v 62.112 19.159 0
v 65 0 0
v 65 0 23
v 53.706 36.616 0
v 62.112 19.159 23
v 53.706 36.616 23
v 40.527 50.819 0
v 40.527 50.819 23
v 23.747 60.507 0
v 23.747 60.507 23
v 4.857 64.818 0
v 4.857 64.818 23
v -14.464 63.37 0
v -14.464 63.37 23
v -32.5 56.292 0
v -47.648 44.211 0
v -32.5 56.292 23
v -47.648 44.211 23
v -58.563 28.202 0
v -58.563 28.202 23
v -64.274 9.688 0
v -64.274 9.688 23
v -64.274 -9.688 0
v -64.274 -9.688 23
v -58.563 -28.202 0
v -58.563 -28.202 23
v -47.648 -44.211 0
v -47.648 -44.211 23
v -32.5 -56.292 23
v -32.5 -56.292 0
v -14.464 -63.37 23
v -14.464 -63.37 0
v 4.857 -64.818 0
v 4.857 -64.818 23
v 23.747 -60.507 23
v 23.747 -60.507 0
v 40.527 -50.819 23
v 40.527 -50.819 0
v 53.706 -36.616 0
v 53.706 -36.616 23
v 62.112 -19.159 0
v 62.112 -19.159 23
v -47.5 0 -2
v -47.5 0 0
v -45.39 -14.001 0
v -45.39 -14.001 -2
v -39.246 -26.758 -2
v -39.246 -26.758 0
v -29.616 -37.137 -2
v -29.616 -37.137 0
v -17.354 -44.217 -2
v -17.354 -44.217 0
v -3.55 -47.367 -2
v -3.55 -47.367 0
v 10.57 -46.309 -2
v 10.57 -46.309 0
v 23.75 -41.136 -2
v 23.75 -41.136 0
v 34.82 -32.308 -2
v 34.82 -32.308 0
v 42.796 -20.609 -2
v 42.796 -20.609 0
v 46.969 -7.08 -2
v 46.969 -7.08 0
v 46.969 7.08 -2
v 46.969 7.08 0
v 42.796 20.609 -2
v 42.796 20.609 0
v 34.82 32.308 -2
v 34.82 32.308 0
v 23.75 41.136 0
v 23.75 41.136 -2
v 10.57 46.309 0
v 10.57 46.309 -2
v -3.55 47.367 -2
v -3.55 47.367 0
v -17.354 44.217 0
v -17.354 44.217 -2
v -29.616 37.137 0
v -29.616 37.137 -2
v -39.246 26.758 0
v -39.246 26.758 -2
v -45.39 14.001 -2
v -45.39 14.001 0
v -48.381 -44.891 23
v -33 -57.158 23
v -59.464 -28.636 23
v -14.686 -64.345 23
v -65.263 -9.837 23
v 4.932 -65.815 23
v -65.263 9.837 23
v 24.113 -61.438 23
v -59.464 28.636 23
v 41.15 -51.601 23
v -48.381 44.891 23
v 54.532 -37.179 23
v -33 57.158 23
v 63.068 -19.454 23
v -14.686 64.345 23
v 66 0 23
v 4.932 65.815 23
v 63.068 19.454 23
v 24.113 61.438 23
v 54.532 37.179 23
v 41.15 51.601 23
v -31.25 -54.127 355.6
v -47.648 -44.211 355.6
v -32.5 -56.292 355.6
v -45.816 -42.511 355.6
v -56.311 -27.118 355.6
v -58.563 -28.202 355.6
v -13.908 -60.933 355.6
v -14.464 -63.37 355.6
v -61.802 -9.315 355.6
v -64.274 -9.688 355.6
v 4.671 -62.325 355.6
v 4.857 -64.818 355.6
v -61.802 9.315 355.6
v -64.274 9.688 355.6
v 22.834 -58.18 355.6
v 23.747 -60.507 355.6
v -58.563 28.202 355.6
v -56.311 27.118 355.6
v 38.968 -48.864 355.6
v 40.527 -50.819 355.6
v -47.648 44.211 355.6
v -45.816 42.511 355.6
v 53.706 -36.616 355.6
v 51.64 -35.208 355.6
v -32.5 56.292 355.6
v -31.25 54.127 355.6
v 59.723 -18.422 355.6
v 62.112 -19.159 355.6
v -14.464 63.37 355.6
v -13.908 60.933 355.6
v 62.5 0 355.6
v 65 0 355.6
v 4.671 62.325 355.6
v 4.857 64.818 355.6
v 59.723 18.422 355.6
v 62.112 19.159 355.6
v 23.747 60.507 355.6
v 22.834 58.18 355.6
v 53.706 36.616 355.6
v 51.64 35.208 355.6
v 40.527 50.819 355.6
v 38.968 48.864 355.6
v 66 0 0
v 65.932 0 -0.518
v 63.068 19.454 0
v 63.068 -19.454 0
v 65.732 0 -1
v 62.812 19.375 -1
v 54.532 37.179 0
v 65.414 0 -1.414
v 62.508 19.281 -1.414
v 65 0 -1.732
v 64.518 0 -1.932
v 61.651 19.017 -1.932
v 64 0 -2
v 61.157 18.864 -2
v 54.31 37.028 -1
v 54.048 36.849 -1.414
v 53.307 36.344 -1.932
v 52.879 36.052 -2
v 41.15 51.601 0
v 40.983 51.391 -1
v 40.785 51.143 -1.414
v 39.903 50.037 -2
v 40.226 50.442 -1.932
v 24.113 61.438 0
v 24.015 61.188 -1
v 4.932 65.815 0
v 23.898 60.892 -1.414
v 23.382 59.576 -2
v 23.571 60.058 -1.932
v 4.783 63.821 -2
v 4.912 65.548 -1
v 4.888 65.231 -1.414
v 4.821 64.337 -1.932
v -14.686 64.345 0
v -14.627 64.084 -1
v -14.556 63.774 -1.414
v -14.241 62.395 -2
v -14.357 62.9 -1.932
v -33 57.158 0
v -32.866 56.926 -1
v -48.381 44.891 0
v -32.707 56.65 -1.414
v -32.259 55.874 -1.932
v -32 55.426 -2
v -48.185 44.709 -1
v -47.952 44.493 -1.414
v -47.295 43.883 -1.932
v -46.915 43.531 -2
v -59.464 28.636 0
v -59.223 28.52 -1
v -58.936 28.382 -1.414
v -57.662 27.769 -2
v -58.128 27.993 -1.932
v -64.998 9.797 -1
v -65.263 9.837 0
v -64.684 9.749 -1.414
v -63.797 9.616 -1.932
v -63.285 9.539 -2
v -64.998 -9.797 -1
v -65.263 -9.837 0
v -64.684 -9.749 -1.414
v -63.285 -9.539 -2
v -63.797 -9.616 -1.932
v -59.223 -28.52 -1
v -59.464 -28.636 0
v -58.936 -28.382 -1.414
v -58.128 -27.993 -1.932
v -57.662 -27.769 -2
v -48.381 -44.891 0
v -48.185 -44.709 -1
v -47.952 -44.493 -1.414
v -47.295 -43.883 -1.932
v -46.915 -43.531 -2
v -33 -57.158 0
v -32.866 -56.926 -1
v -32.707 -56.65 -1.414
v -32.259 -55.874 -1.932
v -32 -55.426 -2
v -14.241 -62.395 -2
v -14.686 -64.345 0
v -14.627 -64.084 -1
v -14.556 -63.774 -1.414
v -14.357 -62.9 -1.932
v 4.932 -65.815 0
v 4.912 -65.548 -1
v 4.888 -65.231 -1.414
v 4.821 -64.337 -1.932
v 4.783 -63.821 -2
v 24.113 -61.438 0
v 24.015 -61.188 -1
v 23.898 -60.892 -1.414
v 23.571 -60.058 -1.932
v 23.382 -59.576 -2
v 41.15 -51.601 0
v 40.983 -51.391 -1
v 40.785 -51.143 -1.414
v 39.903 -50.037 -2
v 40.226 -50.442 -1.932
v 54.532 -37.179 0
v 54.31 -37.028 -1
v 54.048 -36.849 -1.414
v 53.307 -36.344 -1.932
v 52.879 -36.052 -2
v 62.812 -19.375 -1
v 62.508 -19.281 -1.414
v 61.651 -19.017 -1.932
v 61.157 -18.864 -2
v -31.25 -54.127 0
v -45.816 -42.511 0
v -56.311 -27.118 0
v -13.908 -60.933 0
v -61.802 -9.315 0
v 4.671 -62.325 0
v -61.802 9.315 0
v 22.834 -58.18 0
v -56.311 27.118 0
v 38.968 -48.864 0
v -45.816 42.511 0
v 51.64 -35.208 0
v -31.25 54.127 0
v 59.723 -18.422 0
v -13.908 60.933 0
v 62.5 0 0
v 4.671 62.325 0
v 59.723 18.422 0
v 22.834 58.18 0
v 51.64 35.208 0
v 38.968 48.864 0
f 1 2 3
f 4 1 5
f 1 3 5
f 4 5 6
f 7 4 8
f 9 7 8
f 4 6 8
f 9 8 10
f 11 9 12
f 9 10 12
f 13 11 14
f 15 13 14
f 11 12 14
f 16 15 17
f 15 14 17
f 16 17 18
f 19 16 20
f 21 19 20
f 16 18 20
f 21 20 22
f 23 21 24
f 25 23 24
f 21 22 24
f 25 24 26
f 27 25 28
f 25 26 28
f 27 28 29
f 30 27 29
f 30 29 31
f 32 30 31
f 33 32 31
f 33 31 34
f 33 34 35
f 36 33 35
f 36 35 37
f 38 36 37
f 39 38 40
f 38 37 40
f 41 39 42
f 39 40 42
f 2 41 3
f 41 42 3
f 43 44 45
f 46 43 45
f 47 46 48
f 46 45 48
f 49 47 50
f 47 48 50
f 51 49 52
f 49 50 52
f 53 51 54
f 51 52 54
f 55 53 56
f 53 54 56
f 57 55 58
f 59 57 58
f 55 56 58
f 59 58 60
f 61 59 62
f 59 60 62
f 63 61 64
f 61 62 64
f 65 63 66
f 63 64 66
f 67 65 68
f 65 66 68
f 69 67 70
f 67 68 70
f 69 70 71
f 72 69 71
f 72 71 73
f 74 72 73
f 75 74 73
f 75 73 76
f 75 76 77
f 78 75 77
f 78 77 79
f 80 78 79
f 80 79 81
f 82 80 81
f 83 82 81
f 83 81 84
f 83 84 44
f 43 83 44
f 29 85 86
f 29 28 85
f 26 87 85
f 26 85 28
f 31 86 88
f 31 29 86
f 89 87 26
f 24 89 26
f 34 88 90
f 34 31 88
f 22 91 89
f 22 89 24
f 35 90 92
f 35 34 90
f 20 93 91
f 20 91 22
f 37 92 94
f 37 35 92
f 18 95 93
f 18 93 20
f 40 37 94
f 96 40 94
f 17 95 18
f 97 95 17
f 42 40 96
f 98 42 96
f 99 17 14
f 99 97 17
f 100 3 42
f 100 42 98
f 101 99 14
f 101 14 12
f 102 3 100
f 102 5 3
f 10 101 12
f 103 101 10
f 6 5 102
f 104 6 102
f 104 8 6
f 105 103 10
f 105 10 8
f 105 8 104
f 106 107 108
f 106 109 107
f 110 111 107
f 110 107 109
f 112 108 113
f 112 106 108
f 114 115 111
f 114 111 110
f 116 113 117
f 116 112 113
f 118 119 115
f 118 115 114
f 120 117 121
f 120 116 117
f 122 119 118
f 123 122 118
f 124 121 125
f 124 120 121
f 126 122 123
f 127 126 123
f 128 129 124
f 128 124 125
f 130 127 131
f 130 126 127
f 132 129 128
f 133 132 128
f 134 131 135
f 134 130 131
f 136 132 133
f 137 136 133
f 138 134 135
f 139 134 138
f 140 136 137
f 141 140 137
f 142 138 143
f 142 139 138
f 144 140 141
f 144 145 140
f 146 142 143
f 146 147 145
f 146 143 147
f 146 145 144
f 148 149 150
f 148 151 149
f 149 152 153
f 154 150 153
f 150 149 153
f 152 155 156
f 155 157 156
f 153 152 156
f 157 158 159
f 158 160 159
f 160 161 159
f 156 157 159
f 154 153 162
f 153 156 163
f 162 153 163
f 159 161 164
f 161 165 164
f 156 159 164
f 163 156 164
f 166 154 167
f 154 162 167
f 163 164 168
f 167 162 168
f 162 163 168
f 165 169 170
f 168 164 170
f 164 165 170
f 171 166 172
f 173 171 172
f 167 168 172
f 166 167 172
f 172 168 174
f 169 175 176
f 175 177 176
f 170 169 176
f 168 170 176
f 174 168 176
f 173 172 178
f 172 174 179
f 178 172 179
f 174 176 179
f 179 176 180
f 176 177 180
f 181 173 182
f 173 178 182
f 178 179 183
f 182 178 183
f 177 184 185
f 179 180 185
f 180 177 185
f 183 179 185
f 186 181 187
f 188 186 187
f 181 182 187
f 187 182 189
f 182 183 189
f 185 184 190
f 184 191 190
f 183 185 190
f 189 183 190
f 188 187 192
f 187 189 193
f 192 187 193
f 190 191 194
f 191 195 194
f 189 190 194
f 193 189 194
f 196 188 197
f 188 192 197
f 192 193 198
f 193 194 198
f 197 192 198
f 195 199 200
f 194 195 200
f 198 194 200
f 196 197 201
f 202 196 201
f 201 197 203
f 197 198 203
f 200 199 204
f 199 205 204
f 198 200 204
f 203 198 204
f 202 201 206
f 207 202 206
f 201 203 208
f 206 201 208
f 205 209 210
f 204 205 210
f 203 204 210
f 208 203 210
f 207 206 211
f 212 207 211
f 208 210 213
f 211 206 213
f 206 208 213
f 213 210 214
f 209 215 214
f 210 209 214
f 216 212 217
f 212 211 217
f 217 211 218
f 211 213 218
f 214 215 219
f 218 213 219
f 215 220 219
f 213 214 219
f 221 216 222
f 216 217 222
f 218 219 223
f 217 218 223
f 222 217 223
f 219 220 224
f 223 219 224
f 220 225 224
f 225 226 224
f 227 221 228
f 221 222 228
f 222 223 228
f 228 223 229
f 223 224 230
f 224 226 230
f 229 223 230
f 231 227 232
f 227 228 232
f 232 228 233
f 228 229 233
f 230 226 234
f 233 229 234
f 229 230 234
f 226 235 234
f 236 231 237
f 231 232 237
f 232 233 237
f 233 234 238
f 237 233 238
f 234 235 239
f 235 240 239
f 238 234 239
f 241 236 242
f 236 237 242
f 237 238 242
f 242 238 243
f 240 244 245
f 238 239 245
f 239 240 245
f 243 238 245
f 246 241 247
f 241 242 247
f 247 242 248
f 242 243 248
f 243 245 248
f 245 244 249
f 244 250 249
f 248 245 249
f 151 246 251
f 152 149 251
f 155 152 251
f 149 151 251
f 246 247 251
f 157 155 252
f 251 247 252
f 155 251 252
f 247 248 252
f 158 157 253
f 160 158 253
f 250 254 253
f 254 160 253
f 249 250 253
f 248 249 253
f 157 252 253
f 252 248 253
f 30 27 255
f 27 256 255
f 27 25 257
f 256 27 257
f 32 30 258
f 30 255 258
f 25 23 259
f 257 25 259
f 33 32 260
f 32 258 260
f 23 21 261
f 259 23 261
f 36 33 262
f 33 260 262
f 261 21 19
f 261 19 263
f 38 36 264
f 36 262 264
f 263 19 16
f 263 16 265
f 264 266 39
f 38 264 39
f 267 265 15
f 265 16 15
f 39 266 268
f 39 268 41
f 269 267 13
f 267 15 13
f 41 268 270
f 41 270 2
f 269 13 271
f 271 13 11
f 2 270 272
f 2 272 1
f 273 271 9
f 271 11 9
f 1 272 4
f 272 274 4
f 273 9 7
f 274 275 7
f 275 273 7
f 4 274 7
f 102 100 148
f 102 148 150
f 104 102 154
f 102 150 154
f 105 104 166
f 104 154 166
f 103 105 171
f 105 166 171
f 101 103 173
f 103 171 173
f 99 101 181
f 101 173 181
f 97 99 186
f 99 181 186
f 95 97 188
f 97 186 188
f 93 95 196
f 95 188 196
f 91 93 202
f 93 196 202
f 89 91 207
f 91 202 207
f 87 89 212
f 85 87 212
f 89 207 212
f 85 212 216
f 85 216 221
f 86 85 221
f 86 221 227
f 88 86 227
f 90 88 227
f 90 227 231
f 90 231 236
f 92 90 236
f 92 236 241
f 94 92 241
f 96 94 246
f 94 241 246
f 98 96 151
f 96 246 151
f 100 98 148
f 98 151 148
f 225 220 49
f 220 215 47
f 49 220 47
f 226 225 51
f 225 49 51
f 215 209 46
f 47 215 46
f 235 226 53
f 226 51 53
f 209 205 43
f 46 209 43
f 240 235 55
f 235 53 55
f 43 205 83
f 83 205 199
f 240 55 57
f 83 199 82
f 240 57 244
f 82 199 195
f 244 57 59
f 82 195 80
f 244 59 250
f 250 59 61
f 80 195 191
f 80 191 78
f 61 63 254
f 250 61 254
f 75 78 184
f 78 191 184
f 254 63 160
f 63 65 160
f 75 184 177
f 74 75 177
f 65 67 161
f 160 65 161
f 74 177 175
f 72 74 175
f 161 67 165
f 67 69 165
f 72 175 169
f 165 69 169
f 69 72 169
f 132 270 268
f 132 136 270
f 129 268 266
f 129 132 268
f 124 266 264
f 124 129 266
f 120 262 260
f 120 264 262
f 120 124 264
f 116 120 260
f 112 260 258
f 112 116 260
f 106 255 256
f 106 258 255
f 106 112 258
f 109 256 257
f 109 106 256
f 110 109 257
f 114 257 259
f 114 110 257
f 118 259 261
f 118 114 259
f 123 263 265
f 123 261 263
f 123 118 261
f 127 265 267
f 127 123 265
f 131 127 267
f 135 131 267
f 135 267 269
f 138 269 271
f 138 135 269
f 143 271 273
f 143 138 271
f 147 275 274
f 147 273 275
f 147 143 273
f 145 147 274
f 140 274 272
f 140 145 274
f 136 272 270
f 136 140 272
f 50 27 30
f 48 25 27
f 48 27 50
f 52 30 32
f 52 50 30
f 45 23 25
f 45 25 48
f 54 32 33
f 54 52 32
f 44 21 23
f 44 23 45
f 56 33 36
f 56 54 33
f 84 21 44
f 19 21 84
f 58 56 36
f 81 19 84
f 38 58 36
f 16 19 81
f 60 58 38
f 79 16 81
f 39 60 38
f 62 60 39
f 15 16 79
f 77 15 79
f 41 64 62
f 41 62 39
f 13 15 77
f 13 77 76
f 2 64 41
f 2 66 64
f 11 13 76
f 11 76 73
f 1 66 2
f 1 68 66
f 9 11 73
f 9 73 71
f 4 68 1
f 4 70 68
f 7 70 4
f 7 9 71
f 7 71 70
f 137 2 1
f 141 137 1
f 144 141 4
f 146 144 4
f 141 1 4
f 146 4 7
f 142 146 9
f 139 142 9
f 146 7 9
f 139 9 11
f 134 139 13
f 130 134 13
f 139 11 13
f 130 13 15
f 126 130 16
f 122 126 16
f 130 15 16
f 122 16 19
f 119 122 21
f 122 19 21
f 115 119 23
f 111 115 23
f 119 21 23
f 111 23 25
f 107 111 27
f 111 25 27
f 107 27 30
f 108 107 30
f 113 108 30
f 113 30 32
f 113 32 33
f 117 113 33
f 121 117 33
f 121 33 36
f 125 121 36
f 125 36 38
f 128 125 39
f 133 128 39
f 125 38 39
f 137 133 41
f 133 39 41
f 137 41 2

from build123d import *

# Parameters (mm, degrees)
F0_R      = 65
F1_DEPTH  = 355.6
F2_T      = -2.5
F3_DEPTH  = 25
F5_R      = 66
F6_DEPTH  = 25
F7_R      = 65
F8_DEPTH  = 23
F9_R      = 2
F11_D     = 95
F11_DEPTH = 50.8
F11_TIP   = 28.5408794038


with BuildPart() as f1:
    # F0 (on Top) → F1 (new body)
    with BuildSketch(Plane.XY):
        Circle(F0_R)
    extrude(amount=F1_DEPTH)

    # F2
    f2_openings = [f1.faces().sort_by_distance(p)[0] for p in [
        (0, 0, 355.6),
    ]]
    offset(amount=F2_T, openings=f2_openings)

    # F3 (cut): a face of the model
    f3_faces = [f1.faces().sort_by_distance(p)[0] for p in [
        (0, 0, 2.5),
    ]]
    extrude(f3_faces, amount=-F3_DEPTH, mode=Mode.SUBTRACT)


with BuildPart() as f6:
    # F5 (on offset) → F6 (new body)
    with BuildSketch(Plane.XY.offset(-2)):
        Circle(F5_R)
    extrude(amount=F6_DEPTH)

    # F7 (on face) → F8 (cut)
    with BuildSketch(Plane.XY.offset(23)):
        Circle(F7_R)
    extrude(amount=-F8_DEPTH, mode=Mode.SUBTRACT)

    # F9
    f9_edges = [f6.edges().sort_by_distance(p)[0] for p in [
        (-66, 0, -2),
    ]]
    fillet(f9_edges, radius=F9_R)

    # F11
    with Locations(Plane(origin=(0, 0, -2), x_dir=(1, 0, 0), z_dir=(0, 0, -1))):
        with Locations((0, 0)):
            Hole(F11_D / 2, depth=F11_DEPTH)
            with Locations((0, 0, -(F11_DEPTH + F11_TIP / 2))):  # 118° drill point
                Cone(0, F11_D / 2, F11_TIP, mode=Mode.SUBTRACT)


solid = Compound([f1.part, f6.part])
